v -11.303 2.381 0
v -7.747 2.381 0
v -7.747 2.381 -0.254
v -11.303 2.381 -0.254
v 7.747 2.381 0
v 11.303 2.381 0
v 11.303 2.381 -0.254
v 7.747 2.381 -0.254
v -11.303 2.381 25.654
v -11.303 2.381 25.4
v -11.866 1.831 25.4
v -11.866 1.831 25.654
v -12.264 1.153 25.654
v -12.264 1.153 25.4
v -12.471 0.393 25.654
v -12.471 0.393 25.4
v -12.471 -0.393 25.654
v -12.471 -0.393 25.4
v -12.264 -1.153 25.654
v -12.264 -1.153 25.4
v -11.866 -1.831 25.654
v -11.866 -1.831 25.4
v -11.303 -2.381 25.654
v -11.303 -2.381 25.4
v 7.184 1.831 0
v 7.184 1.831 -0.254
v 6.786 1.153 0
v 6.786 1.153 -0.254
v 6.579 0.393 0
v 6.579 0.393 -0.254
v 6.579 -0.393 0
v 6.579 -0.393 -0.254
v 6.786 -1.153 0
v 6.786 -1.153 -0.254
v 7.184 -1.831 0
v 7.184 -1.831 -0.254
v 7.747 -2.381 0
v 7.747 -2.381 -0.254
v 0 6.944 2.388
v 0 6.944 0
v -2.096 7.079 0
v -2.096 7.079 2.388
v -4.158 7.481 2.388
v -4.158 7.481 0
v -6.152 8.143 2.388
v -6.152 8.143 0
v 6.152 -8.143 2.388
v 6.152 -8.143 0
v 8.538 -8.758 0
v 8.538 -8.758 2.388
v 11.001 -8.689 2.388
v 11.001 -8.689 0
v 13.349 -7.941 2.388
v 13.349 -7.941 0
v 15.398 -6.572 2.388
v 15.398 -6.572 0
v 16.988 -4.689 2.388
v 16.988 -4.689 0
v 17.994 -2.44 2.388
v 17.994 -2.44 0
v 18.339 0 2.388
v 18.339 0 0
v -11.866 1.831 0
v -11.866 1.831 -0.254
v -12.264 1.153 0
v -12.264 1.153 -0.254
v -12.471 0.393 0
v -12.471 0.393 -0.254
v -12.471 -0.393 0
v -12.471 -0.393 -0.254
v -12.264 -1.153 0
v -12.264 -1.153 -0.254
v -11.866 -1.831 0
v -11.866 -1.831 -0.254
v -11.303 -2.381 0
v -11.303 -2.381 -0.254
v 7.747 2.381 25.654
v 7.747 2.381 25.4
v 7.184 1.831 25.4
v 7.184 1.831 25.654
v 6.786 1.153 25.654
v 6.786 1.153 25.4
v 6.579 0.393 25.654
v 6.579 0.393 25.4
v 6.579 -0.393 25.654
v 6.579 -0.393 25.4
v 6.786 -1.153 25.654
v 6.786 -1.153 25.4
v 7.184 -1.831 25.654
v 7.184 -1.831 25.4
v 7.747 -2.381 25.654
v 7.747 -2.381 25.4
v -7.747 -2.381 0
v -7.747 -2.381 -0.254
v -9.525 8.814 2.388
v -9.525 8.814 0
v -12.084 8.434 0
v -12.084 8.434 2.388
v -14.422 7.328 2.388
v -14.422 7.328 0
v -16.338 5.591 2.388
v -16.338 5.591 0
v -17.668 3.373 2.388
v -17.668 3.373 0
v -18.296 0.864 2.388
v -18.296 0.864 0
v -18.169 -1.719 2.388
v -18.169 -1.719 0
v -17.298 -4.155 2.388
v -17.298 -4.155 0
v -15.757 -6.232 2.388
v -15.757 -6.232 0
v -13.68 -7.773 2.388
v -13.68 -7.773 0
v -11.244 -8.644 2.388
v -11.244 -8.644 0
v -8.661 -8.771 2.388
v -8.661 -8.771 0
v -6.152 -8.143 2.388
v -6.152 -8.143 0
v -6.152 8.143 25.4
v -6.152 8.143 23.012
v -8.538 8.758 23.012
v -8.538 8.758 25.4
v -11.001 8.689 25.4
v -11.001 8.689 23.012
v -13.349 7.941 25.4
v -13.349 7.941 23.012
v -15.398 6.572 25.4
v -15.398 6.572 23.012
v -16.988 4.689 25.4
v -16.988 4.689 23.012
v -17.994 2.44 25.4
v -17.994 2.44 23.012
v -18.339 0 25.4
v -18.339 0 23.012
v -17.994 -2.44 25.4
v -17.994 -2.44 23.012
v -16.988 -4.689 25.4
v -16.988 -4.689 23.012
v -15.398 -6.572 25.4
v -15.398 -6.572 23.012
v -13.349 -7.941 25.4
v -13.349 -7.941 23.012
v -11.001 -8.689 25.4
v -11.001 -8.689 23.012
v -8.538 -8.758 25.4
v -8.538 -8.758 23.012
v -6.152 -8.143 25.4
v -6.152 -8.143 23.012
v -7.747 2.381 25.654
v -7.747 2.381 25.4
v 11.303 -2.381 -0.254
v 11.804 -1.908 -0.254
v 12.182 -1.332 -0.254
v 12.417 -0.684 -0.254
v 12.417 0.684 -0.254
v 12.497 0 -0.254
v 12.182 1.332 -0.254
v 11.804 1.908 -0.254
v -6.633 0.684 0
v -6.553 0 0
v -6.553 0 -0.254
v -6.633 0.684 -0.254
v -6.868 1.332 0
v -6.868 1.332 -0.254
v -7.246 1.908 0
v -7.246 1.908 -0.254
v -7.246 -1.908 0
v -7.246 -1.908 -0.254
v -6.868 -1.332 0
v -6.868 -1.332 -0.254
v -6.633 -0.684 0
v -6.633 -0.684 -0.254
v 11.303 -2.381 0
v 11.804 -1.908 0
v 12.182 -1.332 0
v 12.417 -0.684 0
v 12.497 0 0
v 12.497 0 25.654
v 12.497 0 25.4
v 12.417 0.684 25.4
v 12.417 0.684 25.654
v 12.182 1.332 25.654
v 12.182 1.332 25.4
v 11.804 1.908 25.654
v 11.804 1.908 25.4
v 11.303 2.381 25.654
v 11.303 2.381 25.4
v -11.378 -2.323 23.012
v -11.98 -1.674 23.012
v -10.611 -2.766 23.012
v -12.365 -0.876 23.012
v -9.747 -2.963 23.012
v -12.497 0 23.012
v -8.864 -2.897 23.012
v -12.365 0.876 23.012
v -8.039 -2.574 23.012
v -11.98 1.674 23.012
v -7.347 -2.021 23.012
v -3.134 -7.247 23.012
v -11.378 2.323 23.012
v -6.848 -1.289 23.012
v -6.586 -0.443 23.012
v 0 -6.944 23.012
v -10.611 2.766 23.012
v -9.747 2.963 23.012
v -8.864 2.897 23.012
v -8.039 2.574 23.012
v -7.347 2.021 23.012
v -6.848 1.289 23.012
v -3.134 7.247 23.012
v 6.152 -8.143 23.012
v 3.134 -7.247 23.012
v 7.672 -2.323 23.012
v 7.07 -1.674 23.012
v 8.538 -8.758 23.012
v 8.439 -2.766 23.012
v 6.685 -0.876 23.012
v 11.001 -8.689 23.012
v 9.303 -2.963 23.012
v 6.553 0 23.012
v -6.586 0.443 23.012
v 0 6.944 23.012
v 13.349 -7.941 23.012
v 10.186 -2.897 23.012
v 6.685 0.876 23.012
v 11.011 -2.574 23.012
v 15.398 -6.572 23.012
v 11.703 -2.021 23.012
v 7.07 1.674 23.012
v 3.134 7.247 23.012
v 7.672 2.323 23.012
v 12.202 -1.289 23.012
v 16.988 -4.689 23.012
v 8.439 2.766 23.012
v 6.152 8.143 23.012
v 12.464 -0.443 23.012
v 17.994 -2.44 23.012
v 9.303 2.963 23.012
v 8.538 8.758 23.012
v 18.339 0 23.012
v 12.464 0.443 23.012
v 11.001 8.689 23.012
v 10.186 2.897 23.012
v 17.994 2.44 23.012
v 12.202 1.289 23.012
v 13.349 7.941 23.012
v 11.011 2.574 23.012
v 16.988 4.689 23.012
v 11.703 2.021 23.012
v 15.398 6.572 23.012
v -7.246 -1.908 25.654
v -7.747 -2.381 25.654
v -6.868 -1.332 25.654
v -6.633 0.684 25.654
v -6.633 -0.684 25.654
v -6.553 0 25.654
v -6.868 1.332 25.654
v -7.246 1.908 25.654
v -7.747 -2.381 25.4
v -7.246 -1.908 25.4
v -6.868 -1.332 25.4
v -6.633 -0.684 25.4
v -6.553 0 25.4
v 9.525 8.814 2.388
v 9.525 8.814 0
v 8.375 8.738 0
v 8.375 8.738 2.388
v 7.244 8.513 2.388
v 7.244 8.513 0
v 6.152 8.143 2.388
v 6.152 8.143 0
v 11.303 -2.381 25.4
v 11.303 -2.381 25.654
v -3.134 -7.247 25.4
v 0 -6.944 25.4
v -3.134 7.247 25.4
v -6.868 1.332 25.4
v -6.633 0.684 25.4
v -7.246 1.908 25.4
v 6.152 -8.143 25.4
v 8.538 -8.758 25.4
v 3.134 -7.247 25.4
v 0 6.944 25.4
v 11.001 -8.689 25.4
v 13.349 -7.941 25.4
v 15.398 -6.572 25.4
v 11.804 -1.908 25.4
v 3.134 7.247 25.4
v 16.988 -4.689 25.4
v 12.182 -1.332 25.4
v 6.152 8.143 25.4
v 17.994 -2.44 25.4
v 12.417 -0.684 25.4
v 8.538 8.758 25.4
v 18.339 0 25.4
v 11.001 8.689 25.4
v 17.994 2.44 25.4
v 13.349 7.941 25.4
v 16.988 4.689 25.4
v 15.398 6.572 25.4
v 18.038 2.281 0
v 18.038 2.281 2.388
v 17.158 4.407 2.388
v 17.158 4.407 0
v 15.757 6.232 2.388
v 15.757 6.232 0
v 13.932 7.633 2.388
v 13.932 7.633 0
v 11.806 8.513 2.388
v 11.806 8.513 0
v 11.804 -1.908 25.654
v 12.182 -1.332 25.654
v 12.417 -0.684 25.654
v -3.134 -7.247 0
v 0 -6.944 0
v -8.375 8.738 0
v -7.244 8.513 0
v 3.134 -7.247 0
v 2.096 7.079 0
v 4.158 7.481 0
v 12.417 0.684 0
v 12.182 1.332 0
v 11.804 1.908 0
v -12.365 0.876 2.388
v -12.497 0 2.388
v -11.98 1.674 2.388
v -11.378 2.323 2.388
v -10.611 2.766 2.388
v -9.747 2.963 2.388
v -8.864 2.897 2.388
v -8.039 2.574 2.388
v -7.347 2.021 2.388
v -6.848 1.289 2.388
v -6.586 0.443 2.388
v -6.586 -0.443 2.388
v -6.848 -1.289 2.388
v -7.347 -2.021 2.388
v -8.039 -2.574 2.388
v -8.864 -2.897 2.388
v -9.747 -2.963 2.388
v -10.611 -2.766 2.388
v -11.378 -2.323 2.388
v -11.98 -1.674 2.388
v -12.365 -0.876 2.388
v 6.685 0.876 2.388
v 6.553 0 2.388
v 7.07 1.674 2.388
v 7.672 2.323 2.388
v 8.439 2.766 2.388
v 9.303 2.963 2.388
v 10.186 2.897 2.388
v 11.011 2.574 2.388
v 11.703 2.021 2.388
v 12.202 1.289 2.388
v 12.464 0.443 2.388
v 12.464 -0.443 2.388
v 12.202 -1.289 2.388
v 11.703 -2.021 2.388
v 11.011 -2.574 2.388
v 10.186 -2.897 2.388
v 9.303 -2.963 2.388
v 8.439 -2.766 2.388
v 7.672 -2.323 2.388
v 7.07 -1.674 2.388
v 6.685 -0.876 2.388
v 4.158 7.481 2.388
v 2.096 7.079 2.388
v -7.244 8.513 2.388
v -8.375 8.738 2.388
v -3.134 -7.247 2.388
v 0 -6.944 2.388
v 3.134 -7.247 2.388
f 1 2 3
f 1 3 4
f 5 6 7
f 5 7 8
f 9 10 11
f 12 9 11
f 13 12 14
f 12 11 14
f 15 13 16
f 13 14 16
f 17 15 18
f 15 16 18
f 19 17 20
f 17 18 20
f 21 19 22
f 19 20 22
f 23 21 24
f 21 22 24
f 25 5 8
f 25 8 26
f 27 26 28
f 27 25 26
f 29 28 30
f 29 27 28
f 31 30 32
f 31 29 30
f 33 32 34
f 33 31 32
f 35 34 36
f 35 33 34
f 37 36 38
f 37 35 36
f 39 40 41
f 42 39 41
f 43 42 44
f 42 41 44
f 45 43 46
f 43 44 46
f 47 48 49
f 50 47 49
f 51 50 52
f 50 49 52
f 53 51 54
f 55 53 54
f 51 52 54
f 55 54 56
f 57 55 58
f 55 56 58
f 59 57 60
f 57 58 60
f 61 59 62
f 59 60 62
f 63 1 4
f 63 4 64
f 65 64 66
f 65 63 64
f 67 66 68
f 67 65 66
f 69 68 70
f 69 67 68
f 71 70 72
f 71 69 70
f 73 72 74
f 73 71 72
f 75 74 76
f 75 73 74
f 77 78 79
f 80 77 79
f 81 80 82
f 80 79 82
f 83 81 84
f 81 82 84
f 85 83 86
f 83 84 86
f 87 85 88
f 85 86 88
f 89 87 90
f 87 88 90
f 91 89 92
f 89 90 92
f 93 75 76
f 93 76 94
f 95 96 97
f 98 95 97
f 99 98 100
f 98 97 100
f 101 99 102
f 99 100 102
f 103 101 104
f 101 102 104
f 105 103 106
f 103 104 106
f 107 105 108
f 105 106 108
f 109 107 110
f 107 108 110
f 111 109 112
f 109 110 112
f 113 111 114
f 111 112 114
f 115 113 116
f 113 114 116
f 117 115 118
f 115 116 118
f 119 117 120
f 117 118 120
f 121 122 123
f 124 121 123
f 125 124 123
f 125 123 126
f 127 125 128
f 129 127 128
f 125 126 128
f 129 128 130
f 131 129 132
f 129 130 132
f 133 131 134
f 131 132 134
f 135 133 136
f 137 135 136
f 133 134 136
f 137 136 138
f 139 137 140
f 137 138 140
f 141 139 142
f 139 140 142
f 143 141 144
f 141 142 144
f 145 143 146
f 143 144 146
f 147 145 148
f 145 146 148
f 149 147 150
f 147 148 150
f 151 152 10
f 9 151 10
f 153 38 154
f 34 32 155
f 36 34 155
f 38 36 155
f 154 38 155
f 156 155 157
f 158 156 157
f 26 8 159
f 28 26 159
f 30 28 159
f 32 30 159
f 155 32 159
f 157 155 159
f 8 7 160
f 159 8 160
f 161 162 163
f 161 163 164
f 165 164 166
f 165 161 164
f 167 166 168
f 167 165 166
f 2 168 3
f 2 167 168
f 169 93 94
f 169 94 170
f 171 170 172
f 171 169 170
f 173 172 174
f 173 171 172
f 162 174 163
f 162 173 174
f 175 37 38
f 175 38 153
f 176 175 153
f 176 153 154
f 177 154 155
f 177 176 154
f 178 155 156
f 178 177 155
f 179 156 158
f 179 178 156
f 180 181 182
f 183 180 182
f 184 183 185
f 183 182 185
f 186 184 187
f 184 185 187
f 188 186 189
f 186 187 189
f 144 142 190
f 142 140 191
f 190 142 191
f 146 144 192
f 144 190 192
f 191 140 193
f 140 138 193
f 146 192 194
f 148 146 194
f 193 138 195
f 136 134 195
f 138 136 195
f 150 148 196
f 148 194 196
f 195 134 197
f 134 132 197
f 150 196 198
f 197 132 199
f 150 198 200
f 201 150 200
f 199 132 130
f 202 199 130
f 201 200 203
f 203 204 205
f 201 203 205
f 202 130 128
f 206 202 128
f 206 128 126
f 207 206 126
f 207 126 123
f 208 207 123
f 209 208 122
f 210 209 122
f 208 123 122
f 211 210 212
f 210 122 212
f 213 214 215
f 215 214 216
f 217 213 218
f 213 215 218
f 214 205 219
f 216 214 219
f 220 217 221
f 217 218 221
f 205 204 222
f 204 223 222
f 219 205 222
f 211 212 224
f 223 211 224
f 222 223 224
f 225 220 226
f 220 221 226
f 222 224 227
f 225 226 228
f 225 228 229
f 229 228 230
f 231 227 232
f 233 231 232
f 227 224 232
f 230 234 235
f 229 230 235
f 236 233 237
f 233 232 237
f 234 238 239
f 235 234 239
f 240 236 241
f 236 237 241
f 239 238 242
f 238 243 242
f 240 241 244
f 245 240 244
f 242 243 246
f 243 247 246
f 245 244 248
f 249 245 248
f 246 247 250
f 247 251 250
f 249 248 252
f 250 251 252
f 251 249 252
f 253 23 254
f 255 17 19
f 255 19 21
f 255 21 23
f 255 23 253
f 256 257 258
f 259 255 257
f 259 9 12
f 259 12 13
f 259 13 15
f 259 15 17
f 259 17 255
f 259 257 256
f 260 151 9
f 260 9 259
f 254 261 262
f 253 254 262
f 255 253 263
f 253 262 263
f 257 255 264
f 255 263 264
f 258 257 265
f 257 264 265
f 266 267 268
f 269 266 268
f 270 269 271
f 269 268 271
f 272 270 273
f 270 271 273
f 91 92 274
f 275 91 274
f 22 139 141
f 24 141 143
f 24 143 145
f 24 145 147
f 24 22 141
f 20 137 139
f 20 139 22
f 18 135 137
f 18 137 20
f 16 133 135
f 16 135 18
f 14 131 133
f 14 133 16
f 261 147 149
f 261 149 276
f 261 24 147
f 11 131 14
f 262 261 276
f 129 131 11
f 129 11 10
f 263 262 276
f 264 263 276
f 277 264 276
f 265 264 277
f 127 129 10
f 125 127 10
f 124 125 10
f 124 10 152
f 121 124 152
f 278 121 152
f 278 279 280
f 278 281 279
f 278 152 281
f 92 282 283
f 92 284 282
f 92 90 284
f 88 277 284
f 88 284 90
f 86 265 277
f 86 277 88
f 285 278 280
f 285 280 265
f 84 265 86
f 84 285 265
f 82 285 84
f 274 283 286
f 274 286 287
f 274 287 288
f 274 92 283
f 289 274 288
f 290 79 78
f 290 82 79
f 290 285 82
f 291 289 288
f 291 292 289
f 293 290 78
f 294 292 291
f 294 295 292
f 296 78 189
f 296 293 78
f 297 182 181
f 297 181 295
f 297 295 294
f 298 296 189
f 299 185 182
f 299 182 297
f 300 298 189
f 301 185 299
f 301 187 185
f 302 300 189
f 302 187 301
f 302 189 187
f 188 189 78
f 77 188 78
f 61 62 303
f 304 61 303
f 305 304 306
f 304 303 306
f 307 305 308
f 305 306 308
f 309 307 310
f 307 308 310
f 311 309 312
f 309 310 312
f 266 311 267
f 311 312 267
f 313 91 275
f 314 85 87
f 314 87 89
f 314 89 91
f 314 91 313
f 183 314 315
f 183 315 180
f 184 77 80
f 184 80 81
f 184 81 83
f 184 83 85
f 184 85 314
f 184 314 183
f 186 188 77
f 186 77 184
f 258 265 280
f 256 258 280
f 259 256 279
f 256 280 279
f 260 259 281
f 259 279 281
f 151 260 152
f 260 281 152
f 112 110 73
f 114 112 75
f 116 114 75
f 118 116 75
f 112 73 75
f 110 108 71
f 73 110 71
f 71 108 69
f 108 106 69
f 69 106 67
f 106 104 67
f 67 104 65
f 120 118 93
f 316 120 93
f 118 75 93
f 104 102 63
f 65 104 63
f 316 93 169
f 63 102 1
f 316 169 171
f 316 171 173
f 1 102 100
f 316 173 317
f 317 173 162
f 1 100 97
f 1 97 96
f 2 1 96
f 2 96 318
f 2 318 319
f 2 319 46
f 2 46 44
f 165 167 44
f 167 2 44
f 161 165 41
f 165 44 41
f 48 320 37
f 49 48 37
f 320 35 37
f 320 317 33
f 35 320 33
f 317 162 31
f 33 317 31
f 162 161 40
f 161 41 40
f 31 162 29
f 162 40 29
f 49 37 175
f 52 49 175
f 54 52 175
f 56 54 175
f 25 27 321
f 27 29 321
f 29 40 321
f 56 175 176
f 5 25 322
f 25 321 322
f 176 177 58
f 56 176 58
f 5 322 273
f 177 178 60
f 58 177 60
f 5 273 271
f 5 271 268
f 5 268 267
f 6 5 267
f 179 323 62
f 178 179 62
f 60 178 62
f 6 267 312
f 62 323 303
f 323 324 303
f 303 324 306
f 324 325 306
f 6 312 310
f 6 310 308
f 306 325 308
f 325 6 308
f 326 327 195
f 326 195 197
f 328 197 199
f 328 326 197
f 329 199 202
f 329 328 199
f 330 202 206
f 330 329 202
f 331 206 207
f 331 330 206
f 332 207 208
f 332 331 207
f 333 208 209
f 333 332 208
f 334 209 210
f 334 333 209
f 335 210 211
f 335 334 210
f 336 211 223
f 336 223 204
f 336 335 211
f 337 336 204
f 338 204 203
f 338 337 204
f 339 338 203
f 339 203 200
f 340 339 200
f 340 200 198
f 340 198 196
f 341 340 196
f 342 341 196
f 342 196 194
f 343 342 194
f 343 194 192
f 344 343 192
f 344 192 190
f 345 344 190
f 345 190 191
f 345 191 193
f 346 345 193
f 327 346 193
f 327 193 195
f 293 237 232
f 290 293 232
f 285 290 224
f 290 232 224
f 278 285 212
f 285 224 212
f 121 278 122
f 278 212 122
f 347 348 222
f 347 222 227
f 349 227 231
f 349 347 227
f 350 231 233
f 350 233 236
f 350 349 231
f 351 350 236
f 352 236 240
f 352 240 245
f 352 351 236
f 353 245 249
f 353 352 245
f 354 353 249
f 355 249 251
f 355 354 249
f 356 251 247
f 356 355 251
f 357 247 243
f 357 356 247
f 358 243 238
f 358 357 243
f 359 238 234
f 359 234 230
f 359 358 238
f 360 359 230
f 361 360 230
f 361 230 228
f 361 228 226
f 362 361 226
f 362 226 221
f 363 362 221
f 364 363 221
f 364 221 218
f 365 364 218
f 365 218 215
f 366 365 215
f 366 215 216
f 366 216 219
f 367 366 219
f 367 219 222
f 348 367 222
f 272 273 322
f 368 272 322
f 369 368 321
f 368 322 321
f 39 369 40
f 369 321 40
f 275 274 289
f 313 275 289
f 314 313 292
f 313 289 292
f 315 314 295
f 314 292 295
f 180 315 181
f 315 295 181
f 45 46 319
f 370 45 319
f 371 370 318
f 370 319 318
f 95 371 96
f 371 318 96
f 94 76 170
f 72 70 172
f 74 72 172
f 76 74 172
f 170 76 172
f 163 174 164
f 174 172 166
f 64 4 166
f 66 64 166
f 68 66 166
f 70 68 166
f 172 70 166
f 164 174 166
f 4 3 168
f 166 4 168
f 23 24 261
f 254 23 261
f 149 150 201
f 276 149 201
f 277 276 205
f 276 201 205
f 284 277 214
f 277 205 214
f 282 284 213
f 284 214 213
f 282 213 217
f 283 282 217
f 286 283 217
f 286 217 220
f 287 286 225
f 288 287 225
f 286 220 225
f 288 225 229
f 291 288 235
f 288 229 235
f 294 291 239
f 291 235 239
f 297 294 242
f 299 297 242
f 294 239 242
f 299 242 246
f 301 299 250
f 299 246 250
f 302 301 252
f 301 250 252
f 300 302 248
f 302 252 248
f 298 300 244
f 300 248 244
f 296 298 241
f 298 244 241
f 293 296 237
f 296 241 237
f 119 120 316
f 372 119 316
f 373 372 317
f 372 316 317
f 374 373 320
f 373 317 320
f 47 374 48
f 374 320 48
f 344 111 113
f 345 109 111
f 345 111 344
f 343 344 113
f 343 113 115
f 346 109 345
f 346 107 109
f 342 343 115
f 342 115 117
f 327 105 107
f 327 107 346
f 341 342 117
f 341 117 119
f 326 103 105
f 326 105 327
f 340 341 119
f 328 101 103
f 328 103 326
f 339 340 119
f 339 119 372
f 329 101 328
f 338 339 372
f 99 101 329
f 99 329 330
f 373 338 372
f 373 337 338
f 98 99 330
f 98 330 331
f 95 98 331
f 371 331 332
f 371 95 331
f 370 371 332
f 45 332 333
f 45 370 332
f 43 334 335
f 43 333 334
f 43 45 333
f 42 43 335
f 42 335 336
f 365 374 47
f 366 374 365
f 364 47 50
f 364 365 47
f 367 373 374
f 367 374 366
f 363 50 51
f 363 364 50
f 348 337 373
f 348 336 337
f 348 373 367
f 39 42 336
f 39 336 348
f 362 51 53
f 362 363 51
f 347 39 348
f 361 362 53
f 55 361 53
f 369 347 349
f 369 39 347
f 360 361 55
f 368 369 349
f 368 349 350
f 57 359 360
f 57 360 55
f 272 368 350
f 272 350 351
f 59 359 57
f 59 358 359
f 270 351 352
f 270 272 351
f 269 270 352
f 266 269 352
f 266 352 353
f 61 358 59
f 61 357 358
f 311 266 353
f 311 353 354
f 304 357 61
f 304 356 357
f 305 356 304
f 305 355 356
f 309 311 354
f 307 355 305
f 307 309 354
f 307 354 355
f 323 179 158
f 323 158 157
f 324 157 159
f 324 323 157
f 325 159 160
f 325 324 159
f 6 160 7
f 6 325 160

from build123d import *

# Parameters (mm, degrees)
SKETCH1_R           = 2.9718
BOSS_EXTRUDE1_DEPTH = 2.3876
SKETCH2_R           = 2.9718
BOSS_EXTRUDE2_DEPTH = 25.4
BOSS_EXTRUDE3_START = -2.3876
BOSS_EXTRUDE3_DEPTH = 2.3876
BOSS_EXTRUDE4_DEPTH = 0.254


with BuildPart() as part:
    # Sketch1 → Boss-Extrude1 (new body)
    # profile 1 of 12: a face of its own
    with BuildSketch(Plane.XY):
        with BuildLine():
            Line((-5.1181, 4.4069), (-9.525, 8.8138))
            ThreePointArc((-9.525, 8.8138), (-18.169445304, -1.71948708), (-6.152104764, -8.142889424))
            ThreePointArc((-6.152104764, -8.142889424), (-2.196593131, -4.89668492), (-0.7112, 0))
            Line((-0.7112, 0), (-5.1181, 4.4069))
        make_face()
        with Locations((-9.525, 0)):
            Circle(SKETCH1_R, mode=Mode.SUBTRACT)
    # profile 2 of 12: a face of its own
    with BuildSketch(Plane.XY):
        with BuildLine():
            ThreePointArc((-6.152104764, 8.142889424), (-7.80551292, 8.644445304), (-9.525, 8.8138))
            Line((-9.525, 8.8138), (-5.1181, 4.4069))
            Line((-5.1181, 4.4069), (-3.292702252, 6.232297748))
            ThreePointArc((-3.292702252, 6.232297748), (-4.62831508, 7.328406869), (-6.152104764, 8.142889424))
        make_face()
    # profile 3 of 12: a face of its own
    with BuildSketch(Plane.XY):
        with BuildLine():
            Line((-3.292702252, 6.232297748), (-5.1181, 4.4069))
            Line((-5.1181, 4.4069), (-0.7112, 0))
            ThreePointArc((-0.7112, 0), (-1.382110576, 3.372895236), (-3.292702252, 6.232297748))
        make_face()
    # profile 4 of 12: a face of its own
    with BuildSketch(Plane.XY):
        with BuildLine():
            ThreePointArc((-3.292702252, 6.232297748), (-1.382110576, 3.372895236), (-0.7112, 0))
            Line((-0.7112, 0), (0.7112, 0))
            ThreePointArc((0.7112, 0), (1.382110576, 3.372895236), (3.292702252, 6.232297748))
            Line((3.292702252, 6.232297748), (0, 6.232297748))
            Line((0, 6.232297748), (-3.292702252, 6.232297748))
        make_face()
    # profile 5 of 12: a face of its own
    with BuildSketch(Plane.XY):
        with BuildLine():
            ThreePointArc((-0.7112, 0), (-2.196593131, -4.89668492), (-6.152104764, -8.142889424))
            ThreePointArc((-6.152104764, -8.142889424), (0, -6.944339829), (6.152104764, -8.142889424))
            ThreePointArc((6.152104764, -8.142889424), (2.196593131, -4.89668492), (0.7112, 0))
            Line((0.7112, 0), (-0.7112, 0))
        make_face()
    # profile 6 of 12: a face of its own
    with BuildSketch(Plane.XY):
        with BuildLine():
            ThreePointArc((18.3388, 0), (15.757297748, 6.232297748), (9.525, 8.8138))
            Line((9.525, 8.8138), (5.1181, 4.4069))
            Line((5.1181, 4.4069), (0.7112, 0))
            ThreePointArc((0.7112, 0), (2.196593131, -4.89668492), (6.152104764, -8.142889424))
            ThreePointArc((6.152104764, -8.142889424), (14.42168492, -7.328406869), (18.3388, 0))
        make_face()
        with Locations((9.525, 0)):
            Circle(SKETCH1_R, mode=Mode.SUBTRACT)
    # profile 7 of 12: a face of its own
    with BuildSketch(Plane.XY):
        with BuildLine():
            Line((5.1181, 4.4069), (9.525, 8.8138))
            ThreePointArc((9.525, 8.8138), (7.80551292, 8.644445304), (6.152104764, 8.142889424))
            ThreePointArc((6.152104764, 8.142889424), (4.62831508, 7.328406869), (3.292702252, 6.232297748))
            Line((3.292702252, 6.232297748), (5.1181, 4.4069))
        make_face()
    # profile 8 of 12: a face of its own
    with BuildSketch(Plane.XY):
        with BuildLine():
            Line((0.7112, 0), (5.1181, 4.4069))
            Line((5.1181, 4.4069), (3.292702252, 6.232297748))
            ThreePointArc((3.292702252, 6.232297748), (1.382110576, 3.372895236), (0.7112, 0))
        make_face()
    # profile 9 of 12: a face of its own
    with BuildSketch(Plane.XY):
        with BuildLine():
            Line((5.1181, 4.4069), (9.525, 8.8138))
            ThreePointArc((9.525, 8.8138), (7.80551292, 8.644445304), (6.152104764, 8.142889424))
            ThreePointArc((6.152104764, 8.142889424), (4.62831508, 7.328406869), (3.292702252, 6.232297748))
            Line((3.292702252, 6.232297748), (5.1181, 4.4069))
        make_face()
    # profile 10 of 12: a face of its own
    with BuildSketch(Plane.XY):
        with BuildLine():
            ThreePointArc((6.152104764, 8.142889424), (3.133883938, 7.246767675), (0, 6.944339829))
            Line((0, 6.944339829), (0, 6.232297748))
            Line((0, 6.232297748), (3.292702252, 6.232297748))
            ThreePointArc((3.292702252, 6.232297748), (4.62831508, 7.328406869), (6.152104764, 8.142889424))
        make_face()
    # profile 11 of 12: a face of its own
    with BuildSketch(Plane.XY):
        with BuildLine():
            ThreePointArc((0, 6.944339829), (-3.133883938, 7.246767675), (-6.152104764, 8.142889424))
            ThreePointArc((-6.152104764, 8.142889424), (-4.62831508, 7.328406869), (-3.292702252, 6.232297748))
            Line((-3.292702252, 6.232297748), (0, 6.232297748))
            Line((0, 6.232297748), (0, 6.944339829))
        make_face()
    # profile 12 of 12: a face of its own
    with BuildSketch(Plane.XY):
        with BuildLine():
            ThreePointArc((-6.152104764, 8.142889424), (-7.80551292, 8.644445304), (-9.525, 8.8138))
            Line((-9.525, 8.8138), (-5.1181, 4.4069))
            Line((-5.1181, 4.4069), (-3.292702252, 6.232297748))
            ThreePointArc((-3.292702252, 6.232297748), (-4.62831508, 7.328406869), (-6.152104764, 8.142889424))
        make_face()
    extrude(amount=BOSS_EXTRUDE1_DEPTH)

    # Sketch2 → Boss-Extrude2 (add)
    with BuildSketch(Plane(origin=(0, 0, 0), x_dir=(-1, 0, 0), z_dir=(0, 0, -1))):
        with Locations((9.525, 0)):
            Circle(SKETCH2_R)
        with Locations((-9.525, 0)):
            Circle(SKETCH2_R)
    extrude(amount=-BOSS_EXTRUDE2_DEPTH)

    # Sketch3 → Boss-Extrude3 (add)
    with BuildSketch(Plane.XY.offset(25.4).offset(BOSS_EXTRUDE3_START)):
        with BuildLine():
            ThreePointArc((6.152104764, -8.142889424), (18.3388, 0), (6.152104764, 8.142889424))
            ThreePointArc((6.152104764, 8.142889424), (0, 6.944339829), (-6.152104764, 8.142889424))
            ThreePointArc((-6.152104764, 8.142889424), (-18.3388, 0), (-6.152104764, -8.142889424))
            ThreePointArc((-6.152104764, -8.142889424), (0, -6.944339829), (6.152104764, -8.142889424))
        make_face()
    extrude(amount=BOSS_EXTRUDE3_DEPTH)

    # Sketch4 → Boss-Extrude4 (add)
    with BuildSketch(Plane.XY.offset(25.4)):
        with BuildLine():
            Line((-11.302988661, -2.38125), (-7.747011339, -2.38125))
            ThreePointArc((-7.747011339, -2.38125), (-6.868364728, -1.331872467), (-6.5532, 0))
            ThreePointArc((-6.5532, 0), (-6.868364728, 1.331872467), (-7.747011339, 2.38125))
            Line((-7.747011339, 2.38125), (-11.302988661, 2.38125))
            ThreePointArc((-11.302988661, 2.38125), (-12.4968, 0), (-11.302988661, -2.38125))
        make_face()
        with BuildLine():
            ThreePointArc((7.747011339, 2.38125), (6.5532, 0), (7.747011339, -2.38125))
            Line((7.747011339, -2.38125), (11.302988661, -2.38125))
            ThreePointArc((11.302988661, -2.38125), (12.181635272, -1.331872467), (12.4968, 0))
            ThreePointArc((12.4968, 0), (12.181635272, 1.331872467), (11.302988661, 2.38125))
            Line((11.302988661, 2.38125), (7.747011339, 2.38125))
        make_face()
    boss_extrude4 = extrude(amount=BOSS_EXTRUDE4_DEPTH)

    # Mirror1: Boss-Extrude4 across plane
    add(boss_extrude4.mirror(Plane.XY.offset(12.7)))


solid = part.part
